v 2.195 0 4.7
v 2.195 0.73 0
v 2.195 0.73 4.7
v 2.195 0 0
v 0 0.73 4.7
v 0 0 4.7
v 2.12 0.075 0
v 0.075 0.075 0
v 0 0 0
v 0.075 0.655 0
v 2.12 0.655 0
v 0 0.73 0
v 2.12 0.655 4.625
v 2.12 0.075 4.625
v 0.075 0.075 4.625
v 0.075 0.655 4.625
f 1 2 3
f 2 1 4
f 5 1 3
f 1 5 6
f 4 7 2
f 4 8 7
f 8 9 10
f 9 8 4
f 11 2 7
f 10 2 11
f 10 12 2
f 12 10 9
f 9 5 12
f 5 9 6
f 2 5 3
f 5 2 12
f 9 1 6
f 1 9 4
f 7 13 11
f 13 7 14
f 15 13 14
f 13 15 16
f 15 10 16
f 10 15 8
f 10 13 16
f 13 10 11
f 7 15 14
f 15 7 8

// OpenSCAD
// file: common.scad
/*
 * Copyright (c) 2021 Peter Piwowarski <peterjpiwowarski@gmail.com>
 *
 * Permission to use, copy, modify, and distribute this model for any
 * purpose with or without fee is hereby granted, provided that the above
 * copyright notice and this permission notice appear in all copies.
 *
 * THE MODEL IS PROVIDED "AS IS" AND THE AUTHOR DISCLAIMS ALL WARRANTIES
 * WITH REGARD TO THIS MODEL INCLUDING ALL IMPLIED WARRANTIES OF
 * MERCHANTABILITY AND FITNESS. IN NO EVENT SHALL THE AUTHOR BE LIABLE FOR
 * ANY SPECIAL, DIRECT, INDIRECT, OR CONSEQUENTIAL DAMAGES OR ANY DAMAGES
 * WHATSOEVER RESULTING FROM LOSS OF USE, DATA OR PROFITS, WHETHER IN AN
 * ACTION OF CONTRACT, NEGLIGENCE OR OTHER TORTIOUS ACTION, ARISING OUT OF
 * OR IN CONNECTION WITH THE USE OR PERFORMANCE OF THIS MODEL.
 */

include <MCAD/constants.scad>

no_blades = 6;
blade_base_dia = 0.280;
blade_wingspan = 0.410; // See xcelite-99-blade-case.scad
blade_wing_thickness = 0.110;
blade_angle = 90; // 0 for minimum depth, 90 for minimum width
blade_overall_length = 5;
wall_thickness = 0.075;

/*
 * Increase for tools with heads bigger than the handle's socket. Set negative
 * to pack tools closer together for angles other than 0 or 90.
 */
tool_spacing_x = 0.025;
tool_spacing_y = wall_thickness;

// Increase for small values of tool_spacing_*_def
outside_pad = wall_thickness;


// Single perimeter with a 0.4mm nozzle, for vase mode
// cap_thickness = 0.45 / mm_per_inch;
cap_thickness = 0.075;
cap_clearance = 0.003;
cap_overlap = 1;
solid_cap = 0;

socket_clearance = 0.007;
socket_depth = 1.5;

function socket_width(blade_base_dia, blade_wingspan, blade_wing_thickness, blade_angle)
	= max(blade_base_dia, cos(blade_angle) * blade_wingspan + cos(90 - blade_angle) * blade_wing_thickness);

function socket_height(blade_base_dia, blade_wingspan, blade_wing_thickness, blade_angle)
	= max(blade_base_dia, sin(blade_angle) * blade_wingspan + sin(90 - blade_angle) * blade_wing_thickness);
// main file
/*
 * Copyright (c) 2021 Peter Piwowarski <peterjpiwowarski@gmail.com>
 *
 * Permission to use, copy, modify, and distribute this model for any
 * purpose with or without fee is hereby granted, provided that the above
 * copyright notice and this permission notice appear in all copies.
 *
 * THE MODEL IS PROVIDED "AS IS" AND THE AUTHOR DISCLAIMS ALL WARRANTIES
 * WITH REGARD TO THIS MODEL INCLUDING ALL IMPLIED WARRANTIES OF
 * MERCHANTABILITY AND FITNESS. IN NO EVENT SHALL THE AUTHOR BE LIABLE FOR
 * ANY SPECIAL, DIRECT, INDIRECT, OR CONSEQUENTIAL DAMAGES OR ANY DAMAGES
 * WHATSOEVER RESULTING FROM LOSS OF USE, DATA OR PROFITS, WHETHER IN AN
 * ACTION OF CONTRACT, NEGLIGENCE OR OTHER TORTIOUS ACTION, ARISING OUT OF
 * OR IN CONNECTION WITH THE USE OR PERFORMANCE OF THIS MODEL.
 */

include <common.scad>

module xcelite_99_blade_case_cap(
	no_blades = no_blades,
	blade_base_dia = blade_base_dia,
	/*
	 * wingspan: max distance from one wing's outer surface to the other:
	 *
	 *      ___
	 *  ___/ ^ \_______
	 * |___  |  _______--------
	 *     \_v_/
	 */
	blade_wingspan = blade_wingspan,
	blade_wing_thickness = blade_wing_thickness,
	// 0 is wingtip-to-wingtip, 90 is flat-to-flat.
	blade_angle = blade_angle,
	socket_clearance = socket_clearance,
	tool_spacing_x = tool_spacing_x,
	tool_spacing_y = tool_spacing_y,
	outside_pad = outside_pad,

	thickness = cap_thickness,
	height = blade_overall_length - (socket_depth - cap_overlap) + 0.125,
	clearance = cap_clearance,
	// switch to 'true' to make a solid block printable in vase mode
	solid = solid_cap,
	followthrough = 0.01
)
{
	slop = 2 * clearance;
	walls = 2 * thickness;
	pad_x = max(tool_spacing_x, outside_pad);
	pad_y = max(tool_spacing_y, outside_pad);
	width = no_blades * (socket_width(
		blade_base_dia,
		blade_wingspan,
		blade_wing_thickness,
		blade_angle
	) + 2 * socket_clearance) + (no_blades - 1) * tool_spacing_x + 2 * pad_x + slop;
	depth = 2 * pad_y + socket_height(
		blade_base_dia,
		blade_wingspan,
		blade_wing_thickness,
		blade_angle
	) + 2 * socket_clearance + slop;

	difference()
	{
		cube([width + walls, depth + walls, height + thickness]);
		if (!solid)
		{
			translate([thickness, thickness, -followthrough])
			{
				cube([width, depth, height + followthrough]);
			}
		}
	}
}

xcelite_99_blade_case_cap();
